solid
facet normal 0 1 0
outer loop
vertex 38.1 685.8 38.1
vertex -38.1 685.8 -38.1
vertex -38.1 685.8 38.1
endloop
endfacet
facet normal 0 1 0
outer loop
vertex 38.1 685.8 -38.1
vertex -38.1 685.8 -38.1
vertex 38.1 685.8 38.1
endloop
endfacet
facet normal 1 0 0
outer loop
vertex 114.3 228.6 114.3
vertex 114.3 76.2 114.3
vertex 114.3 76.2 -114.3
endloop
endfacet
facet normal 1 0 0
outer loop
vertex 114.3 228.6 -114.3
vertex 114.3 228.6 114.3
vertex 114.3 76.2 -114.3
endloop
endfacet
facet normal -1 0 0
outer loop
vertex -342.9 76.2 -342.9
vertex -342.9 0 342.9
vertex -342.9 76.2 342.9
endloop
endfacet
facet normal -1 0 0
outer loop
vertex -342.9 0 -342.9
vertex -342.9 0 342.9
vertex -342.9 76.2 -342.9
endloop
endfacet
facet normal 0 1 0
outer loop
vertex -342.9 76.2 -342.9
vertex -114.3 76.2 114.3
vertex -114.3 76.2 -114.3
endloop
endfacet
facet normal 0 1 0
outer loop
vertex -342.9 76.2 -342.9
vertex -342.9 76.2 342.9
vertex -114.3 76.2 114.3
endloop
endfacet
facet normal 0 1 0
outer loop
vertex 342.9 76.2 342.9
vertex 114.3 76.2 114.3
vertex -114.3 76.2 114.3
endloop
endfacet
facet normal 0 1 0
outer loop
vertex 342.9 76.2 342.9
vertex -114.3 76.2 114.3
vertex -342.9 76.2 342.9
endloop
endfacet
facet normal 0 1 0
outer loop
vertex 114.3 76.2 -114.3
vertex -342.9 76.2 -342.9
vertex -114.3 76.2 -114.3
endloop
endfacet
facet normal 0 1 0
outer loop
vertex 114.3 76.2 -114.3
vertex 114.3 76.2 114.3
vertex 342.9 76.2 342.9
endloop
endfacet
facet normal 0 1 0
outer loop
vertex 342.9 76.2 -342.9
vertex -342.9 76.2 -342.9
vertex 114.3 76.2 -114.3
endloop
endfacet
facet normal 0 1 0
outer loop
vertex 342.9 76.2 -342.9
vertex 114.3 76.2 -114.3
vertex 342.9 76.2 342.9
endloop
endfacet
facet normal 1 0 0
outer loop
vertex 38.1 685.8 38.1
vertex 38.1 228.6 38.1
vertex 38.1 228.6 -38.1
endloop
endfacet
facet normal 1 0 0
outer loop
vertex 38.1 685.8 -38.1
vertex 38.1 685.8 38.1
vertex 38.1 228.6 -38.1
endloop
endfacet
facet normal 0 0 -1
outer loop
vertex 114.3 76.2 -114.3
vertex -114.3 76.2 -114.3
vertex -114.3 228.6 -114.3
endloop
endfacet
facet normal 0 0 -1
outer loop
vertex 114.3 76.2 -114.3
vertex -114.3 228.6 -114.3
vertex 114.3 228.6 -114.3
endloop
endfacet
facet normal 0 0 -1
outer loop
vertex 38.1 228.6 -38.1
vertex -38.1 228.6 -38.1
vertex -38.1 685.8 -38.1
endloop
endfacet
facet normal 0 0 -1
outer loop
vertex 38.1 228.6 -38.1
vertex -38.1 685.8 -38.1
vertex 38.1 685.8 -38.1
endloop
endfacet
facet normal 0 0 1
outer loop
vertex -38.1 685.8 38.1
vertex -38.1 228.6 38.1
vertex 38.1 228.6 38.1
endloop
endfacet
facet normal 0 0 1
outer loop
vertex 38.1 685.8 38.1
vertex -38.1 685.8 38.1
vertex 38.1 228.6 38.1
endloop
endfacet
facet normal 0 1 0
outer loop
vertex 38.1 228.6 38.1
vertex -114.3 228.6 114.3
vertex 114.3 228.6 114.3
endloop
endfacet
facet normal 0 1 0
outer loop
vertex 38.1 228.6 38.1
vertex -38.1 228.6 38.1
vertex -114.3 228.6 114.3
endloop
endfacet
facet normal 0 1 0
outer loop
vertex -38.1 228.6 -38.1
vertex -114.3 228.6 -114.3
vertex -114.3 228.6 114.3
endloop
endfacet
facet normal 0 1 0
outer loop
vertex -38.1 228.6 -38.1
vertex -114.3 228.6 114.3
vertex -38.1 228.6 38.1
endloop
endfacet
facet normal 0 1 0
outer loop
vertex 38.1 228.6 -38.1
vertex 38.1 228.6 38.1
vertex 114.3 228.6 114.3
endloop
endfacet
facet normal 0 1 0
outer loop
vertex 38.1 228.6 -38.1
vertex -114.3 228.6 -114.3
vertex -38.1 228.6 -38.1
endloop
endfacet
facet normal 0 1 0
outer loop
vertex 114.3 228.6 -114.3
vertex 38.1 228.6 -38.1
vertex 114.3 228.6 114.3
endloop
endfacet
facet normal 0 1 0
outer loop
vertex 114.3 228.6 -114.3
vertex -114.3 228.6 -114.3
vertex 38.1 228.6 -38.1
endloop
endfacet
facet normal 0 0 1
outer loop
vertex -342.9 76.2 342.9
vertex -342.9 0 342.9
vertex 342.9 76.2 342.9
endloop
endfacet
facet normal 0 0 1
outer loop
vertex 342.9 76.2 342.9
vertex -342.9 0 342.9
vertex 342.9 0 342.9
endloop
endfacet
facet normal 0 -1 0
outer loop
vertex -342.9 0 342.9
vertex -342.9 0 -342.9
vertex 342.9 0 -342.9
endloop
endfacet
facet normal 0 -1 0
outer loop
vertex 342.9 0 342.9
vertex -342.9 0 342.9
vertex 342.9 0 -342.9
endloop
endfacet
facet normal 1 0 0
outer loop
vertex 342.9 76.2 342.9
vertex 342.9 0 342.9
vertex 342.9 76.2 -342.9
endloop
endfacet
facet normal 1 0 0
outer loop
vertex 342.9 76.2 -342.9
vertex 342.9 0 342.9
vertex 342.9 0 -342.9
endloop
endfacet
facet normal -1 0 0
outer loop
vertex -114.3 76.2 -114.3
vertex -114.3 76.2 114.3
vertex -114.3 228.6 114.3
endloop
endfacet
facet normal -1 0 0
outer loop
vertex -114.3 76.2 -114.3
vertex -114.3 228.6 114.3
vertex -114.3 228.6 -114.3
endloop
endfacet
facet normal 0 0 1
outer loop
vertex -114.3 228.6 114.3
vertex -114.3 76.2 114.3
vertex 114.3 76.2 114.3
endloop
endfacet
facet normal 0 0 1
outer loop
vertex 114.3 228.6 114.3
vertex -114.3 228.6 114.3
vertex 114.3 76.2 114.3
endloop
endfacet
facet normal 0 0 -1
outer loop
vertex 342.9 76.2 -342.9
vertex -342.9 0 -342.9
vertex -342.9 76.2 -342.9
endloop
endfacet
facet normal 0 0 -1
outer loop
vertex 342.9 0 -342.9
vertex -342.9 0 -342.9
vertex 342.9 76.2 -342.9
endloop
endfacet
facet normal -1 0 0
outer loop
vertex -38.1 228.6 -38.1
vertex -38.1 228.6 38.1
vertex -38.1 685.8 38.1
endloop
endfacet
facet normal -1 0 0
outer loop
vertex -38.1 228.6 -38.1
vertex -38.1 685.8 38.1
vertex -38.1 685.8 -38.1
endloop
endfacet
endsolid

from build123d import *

# Parameters (mm, degrees)
SKETCH1_W           = 76.2
SKETCH1_H           = 76.2
BOSS_EXTRUDE1_DEPTH = 685.8
SKETCH1_3_W         = 228.6
SKETCH1_3_H         = 228.6
SKETCH1_3_W_2       = 76.2
SKETCH1_3_H_2       = 76.2
BOSS_EXTRUDE2_DEPTH = 228.6
SKETCH1_4_W         = 685.8
SKETCH1_4_H         = 685.8
SKETCH1_4_W_2       = 228.6
SKETCH1_4_H_2       = 228.6
BOSS_EXTRUDE3_DEPTH = 76.2


with BuildPart() as part:
    # Sketch1 → Boss-Extrude1 (new body)
    with BuildSketch(Plane(origin=(0, 0, 0), x_dir=(1, 0, 0), z_dir=(0, 1, 0))):
        Rectangle(SKETCH1_W, SKETCH1_H)
    extrude(amount=BOSS_EXTRUDE1_DEPTH)

    # Sketch1<3> → Boss-Extrude2 (add)
    with BuildSketch(Plane(origin=(0, 0, 0), x_dir=(1, 0, 0), z_dir=(0, 1, 0))):
        Rectangle(SKETCH1_3_W, SKETCH1_3_H)
        Rectangle(SKETCH1_3_W_2, SKETCH1_3_H_2, mode=Mode.SUBTRACT)
    extrude(amount=BOSS_EXTRUDE2_DEPTH)

    # Sketch1<4> → Boss-Extrude3 (add)
    with BuildSketch(Plane(origin=(0, 0, 0), x_dir=(1, 0, 0), z_dir=(0, 1, 0))):
        Rectangle(SKETCH1_4_W, SKETCH1_4_H)
        Rectangle(SKETCH1_4_W_2, SKETCH1_4_H_2, mode=Mode.SUBTRACT)
    extrude(amount=BOSS_EXTRUDE3_DEPTH)


solid = part.part
